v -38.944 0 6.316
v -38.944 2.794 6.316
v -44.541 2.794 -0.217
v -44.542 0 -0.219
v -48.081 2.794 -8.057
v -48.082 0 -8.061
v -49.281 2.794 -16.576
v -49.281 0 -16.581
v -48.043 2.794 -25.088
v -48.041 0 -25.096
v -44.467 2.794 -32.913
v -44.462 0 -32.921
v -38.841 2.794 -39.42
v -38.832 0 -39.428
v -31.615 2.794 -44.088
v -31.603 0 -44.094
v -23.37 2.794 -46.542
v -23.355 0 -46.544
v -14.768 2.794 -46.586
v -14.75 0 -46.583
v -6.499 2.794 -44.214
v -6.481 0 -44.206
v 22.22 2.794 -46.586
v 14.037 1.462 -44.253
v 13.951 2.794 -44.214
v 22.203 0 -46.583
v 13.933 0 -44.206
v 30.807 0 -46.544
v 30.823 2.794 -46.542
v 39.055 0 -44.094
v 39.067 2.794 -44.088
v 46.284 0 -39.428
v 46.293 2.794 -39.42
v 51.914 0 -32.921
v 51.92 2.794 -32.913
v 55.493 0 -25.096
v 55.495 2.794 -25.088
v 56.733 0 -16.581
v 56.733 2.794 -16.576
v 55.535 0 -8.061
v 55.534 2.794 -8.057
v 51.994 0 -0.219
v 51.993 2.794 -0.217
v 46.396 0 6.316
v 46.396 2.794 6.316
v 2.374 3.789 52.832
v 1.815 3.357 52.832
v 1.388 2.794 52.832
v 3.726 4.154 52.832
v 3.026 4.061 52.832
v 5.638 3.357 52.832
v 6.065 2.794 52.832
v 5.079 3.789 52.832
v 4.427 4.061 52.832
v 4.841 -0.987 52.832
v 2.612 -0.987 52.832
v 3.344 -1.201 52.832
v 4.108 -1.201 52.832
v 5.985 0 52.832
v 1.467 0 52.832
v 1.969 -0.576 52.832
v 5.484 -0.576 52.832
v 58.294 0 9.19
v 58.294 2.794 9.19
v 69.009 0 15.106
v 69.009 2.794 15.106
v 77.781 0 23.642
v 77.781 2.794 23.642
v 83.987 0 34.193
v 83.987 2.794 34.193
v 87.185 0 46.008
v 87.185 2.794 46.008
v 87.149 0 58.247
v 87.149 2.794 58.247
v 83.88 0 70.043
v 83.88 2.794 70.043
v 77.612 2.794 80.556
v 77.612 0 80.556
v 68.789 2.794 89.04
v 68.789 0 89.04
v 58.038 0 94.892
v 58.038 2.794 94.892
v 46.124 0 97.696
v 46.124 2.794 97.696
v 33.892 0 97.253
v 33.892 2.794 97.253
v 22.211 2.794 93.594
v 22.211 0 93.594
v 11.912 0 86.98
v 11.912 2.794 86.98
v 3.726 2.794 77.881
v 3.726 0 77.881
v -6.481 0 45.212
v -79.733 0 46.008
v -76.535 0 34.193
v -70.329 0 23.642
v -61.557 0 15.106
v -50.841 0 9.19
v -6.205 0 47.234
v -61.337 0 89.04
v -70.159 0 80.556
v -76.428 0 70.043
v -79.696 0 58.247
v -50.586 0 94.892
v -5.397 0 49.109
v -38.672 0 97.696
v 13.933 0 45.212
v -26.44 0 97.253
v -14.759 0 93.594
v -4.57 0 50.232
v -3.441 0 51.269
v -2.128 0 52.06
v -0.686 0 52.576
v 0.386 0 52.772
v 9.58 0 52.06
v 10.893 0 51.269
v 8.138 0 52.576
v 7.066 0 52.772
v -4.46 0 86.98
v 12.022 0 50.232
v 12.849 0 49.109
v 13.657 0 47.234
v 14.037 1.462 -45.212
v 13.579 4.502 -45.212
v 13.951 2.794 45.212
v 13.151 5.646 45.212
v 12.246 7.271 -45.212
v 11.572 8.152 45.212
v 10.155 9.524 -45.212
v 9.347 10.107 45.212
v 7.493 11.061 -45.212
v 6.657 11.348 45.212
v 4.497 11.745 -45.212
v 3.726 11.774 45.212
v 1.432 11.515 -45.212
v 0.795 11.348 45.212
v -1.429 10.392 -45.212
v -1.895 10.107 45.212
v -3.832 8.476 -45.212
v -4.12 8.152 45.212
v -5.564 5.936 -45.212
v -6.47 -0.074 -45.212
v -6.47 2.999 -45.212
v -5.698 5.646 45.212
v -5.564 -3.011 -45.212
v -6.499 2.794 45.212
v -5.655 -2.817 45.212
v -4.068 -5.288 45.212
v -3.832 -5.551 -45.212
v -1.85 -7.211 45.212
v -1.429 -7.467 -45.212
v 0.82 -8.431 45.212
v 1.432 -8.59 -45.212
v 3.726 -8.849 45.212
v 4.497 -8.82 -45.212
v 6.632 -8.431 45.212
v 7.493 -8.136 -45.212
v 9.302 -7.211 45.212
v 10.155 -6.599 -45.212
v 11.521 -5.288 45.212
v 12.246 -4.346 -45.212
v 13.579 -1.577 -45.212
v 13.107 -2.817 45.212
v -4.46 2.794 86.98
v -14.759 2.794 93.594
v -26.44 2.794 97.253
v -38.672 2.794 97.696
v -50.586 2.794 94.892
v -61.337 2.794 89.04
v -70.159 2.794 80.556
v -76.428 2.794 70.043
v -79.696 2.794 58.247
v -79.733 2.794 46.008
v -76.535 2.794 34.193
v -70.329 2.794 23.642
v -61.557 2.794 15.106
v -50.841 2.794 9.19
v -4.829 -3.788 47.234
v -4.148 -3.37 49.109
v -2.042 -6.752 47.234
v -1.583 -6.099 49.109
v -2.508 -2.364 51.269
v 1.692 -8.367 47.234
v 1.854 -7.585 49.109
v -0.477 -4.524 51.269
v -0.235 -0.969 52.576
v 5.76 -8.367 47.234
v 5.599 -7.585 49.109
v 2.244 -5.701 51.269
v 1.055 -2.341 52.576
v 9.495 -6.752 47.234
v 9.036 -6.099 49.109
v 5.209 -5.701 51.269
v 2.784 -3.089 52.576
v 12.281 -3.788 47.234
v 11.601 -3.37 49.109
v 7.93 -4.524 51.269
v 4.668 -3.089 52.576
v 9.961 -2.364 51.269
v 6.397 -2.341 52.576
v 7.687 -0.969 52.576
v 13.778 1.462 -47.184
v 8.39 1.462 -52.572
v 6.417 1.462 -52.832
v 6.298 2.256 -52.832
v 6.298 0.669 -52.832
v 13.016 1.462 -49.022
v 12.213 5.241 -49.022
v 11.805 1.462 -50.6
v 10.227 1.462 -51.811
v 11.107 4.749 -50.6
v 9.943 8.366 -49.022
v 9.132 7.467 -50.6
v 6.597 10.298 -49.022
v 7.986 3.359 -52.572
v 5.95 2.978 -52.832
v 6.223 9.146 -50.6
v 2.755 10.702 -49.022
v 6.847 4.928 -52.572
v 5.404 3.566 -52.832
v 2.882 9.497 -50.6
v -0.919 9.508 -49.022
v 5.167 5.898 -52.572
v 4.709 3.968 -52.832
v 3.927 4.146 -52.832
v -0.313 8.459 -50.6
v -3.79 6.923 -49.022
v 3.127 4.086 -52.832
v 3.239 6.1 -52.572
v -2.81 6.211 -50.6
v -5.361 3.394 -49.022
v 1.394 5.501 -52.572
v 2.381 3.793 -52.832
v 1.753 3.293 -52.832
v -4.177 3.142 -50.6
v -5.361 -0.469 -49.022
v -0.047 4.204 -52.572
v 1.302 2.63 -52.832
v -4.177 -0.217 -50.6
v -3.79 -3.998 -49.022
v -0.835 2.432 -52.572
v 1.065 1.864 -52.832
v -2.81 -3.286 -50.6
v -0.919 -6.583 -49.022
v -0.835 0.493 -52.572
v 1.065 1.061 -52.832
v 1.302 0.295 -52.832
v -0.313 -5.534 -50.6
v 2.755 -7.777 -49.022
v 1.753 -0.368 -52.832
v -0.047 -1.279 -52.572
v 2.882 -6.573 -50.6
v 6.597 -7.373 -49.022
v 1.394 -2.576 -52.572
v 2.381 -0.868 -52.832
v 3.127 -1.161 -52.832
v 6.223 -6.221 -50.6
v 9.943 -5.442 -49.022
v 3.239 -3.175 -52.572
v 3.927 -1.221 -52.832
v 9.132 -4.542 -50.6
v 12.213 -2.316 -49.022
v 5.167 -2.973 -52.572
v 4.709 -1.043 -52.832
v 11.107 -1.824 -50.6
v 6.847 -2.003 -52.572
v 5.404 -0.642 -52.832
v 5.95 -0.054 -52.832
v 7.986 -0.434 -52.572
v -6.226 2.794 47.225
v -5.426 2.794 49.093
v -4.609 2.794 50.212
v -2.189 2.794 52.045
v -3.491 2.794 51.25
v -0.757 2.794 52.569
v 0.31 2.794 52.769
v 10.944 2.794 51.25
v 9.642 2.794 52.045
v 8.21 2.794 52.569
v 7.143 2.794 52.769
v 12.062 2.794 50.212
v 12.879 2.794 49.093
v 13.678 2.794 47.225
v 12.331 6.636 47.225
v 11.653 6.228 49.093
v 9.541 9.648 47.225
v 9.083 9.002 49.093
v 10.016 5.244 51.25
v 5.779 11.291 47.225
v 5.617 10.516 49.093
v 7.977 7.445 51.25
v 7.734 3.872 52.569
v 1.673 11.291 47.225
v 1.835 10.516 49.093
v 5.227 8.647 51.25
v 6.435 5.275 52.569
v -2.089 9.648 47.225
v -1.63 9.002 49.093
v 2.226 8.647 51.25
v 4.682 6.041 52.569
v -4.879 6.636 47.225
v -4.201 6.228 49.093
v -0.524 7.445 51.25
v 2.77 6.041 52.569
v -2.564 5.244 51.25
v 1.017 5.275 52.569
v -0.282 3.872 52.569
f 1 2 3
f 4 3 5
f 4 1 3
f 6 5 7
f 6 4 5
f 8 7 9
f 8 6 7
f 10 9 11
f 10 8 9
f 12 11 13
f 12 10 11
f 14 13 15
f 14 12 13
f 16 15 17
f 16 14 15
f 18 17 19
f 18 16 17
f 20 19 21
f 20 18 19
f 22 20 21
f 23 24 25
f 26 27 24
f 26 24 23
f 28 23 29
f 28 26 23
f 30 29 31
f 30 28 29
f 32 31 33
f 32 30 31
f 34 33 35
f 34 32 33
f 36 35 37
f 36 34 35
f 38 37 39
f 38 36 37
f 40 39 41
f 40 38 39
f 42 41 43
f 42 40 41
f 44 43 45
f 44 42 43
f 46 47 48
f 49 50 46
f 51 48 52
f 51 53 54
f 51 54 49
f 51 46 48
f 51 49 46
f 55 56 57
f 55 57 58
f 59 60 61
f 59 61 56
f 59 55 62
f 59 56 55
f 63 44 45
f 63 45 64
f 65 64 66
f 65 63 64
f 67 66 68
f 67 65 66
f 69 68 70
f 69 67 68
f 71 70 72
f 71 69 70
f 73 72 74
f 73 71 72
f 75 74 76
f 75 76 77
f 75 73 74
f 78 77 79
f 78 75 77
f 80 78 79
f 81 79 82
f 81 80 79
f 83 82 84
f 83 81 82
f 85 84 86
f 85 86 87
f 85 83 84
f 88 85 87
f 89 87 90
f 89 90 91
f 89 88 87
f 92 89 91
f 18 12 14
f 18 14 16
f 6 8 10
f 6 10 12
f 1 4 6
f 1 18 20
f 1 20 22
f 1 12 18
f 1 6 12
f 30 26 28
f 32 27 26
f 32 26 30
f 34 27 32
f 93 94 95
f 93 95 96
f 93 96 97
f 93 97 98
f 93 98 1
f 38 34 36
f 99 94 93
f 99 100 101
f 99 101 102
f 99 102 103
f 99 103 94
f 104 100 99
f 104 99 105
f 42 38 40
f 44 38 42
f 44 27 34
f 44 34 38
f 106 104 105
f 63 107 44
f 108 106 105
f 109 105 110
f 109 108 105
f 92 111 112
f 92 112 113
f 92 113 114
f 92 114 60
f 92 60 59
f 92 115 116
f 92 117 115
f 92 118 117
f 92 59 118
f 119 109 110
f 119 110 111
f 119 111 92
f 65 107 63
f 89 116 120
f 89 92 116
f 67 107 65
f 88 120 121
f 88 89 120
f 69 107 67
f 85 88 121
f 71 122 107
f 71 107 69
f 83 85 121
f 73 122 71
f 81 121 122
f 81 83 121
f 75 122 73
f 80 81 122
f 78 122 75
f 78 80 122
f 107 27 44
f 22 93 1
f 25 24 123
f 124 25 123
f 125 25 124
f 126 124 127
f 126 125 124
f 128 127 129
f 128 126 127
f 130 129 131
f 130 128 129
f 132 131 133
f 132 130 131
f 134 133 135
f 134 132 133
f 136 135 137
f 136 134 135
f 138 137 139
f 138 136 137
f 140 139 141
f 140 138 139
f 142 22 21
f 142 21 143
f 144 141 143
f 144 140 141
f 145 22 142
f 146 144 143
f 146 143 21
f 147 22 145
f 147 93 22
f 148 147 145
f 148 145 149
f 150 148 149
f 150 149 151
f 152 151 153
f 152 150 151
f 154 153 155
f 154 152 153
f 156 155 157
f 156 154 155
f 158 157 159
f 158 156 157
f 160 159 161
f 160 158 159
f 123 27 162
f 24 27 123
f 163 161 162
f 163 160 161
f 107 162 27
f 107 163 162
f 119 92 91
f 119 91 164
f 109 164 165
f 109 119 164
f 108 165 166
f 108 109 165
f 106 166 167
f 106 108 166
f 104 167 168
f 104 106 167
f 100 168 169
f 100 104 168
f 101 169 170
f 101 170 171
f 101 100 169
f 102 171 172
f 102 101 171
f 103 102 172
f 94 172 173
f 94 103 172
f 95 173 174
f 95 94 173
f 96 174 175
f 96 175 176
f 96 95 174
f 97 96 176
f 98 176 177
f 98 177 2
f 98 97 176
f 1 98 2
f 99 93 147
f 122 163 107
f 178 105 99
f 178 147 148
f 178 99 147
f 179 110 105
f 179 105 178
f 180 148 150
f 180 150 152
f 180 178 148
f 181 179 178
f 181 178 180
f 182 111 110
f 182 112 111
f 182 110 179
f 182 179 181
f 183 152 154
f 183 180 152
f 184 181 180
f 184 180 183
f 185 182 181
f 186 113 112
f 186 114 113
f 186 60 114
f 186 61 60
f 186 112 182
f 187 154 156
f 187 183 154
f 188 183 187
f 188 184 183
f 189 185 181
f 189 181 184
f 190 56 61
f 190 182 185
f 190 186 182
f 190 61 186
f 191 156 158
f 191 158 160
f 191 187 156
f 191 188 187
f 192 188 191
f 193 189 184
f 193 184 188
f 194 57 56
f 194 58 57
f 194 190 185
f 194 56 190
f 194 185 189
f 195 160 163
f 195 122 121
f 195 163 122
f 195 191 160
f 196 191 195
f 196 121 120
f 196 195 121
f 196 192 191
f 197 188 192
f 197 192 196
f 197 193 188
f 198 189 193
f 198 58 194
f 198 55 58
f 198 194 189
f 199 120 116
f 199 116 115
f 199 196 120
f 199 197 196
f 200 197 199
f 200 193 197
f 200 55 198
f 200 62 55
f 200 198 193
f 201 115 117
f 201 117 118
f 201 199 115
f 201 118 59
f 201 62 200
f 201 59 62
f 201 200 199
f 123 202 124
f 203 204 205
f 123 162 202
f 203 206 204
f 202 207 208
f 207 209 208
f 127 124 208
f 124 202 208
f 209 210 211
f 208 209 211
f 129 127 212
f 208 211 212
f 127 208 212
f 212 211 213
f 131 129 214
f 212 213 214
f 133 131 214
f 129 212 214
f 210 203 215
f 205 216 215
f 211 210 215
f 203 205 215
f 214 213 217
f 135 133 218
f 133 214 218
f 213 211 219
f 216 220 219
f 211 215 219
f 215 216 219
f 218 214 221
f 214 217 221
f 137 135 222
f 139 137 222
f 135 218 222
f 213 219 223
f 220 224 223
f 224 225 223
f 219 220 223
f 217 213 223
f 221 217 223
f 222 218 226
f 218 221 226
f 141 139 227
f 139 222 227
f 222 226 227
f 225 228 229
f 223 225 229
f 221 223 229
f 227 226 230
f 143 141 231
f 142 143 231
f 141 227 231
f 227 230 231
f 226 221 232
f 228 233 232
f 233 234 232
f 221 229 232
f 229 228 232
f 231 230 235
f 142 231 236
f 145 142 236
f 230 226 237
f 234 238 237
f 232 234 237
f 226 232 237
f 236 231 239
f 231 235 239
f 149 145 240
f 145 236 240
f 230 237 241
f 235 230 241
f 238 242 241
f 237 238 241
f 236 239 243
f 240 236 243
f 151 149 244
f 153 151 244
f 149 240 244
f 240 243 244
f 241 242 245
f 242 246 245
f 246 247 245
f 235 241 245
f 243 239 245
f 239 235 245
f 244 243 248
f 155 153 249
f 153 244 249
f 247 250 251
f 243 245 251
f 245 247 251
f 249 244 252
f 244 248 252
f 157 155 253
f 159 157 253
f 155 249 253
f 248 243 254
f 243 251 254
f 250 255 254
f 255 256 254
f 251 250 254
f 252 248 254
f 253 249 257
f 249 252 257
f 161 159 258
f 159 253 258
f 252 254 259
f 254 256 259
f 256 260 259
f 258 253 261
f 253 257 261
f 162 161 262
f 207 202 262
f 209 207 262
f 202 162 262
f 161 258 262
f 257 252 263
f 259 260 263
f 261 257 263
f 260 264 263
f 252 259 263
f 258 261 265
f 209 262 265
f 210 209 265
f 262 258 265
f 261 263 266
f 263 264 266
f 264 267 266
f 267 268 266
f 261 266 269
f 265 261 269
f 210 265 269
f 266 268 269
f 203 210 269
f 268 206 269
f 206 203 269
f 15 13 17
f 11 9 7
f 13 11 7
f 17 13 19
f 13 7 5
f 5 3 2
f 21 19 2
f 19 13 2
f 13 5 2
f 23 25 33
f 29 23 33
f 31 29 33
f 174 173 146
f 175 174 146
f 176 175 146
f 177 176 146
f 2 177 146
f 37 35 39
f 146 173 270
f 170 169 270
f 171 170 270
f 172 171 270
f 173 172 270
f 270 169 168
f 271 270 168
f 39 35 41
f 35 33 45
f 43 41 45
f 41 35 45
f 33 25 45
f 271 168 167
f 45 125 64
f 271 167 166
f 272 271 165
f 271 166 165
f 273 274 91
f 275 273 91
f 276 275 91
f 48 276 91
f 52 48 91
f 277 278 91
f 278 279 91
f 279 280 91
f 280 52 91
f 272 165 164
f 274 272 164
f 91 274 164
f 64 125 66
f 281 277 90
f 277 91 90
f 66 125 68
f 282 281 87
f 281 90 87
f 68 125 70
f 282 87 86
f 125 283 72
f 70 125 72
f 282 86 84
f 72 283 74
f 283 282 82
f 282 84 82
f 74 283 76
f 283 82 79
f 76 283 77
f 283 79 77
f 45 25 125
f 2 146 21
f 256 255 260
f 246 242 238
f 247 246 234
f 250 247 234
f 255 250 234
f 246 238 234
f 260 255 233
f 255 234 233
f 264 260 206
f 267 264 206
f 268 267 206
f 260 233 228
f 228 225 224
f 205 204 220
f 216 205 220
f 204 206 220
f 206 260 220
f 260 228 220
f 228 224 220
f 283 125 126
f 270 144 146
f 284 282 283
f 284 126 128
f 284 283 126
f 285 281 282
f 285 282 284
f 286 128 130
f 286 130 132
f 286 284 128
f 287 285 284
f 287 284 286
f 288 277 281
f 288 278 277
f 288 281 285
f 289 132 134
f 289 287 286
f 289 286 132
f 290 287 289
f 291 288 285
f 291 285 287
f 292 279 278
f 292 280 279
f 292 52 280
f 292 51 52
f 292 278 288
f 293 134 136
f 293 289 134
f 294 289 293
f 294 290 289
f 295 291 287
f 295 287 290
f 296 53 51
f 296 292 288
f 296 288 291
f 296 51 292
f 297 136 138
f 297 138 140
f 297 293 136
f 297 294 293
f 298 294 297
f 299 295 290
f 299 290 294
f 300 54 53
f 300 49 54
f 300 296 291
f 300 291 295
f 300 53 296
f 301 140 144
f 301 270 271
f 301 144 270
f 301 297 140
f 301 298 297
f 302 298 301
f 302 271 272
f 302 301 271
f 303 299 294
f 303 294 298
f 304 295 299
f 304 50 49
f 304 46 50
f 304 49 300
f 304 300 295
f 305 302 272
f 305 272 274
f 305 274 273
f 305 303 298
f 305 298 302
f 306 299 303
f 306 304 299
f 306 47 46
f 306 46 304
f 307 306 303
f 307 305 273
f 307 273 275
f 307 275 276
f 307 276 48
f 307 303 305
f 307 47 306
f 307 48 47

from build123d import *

# Parameters (mm, degrees)
F1_DEPTH = 2.794
F2_R     = 10.311157
F3_DEPTH = 52.832
F4_R     = 7.62


with BuildPart() as f1:
    # F0 (on Front) → F1 (new body)
    with BuildSketch(Plane.XZ):
        with BuildLine():
            ThreePointArc((3.726169, 77.880541), (-73.645444, 75.509353), (-38.943787, 6.315538))
            ThreePointArc((-38.943787, 6.315538), (-40.482903, -37.881597), (3.726169, -36.735482))
            ThreePointArc((3.726169, -36.735482), (47.935241, -37.881597), (46.396125, 6.315538))
            ThreePointArc((46.396125, 6.315538), (81.097782, 75.509353), (3.726169, 77.880541))
        make_face()
    extrude(amount=-F1_DEPTH)

    # F2 (on Top) → F3 (join, symmetric)
    with BuildSketch(Plane.XY):
        with Locations((3.726171, 1.462447)):
            Circle(F2_R)
    extrude(amount=F3_DEPTH, both=True)

    # F4
    f4_edges = [f1.edges().sort_by_distance(p)[0] for p in [
        (3.726171, 11.773604, 52.832),
        (3.726171, -8.84871, 52.832),
        (-6.584986, 1.462447, -52.832),
    ]]
    fillet(f4_edges, radius=F4_R)


solid = f1.part
